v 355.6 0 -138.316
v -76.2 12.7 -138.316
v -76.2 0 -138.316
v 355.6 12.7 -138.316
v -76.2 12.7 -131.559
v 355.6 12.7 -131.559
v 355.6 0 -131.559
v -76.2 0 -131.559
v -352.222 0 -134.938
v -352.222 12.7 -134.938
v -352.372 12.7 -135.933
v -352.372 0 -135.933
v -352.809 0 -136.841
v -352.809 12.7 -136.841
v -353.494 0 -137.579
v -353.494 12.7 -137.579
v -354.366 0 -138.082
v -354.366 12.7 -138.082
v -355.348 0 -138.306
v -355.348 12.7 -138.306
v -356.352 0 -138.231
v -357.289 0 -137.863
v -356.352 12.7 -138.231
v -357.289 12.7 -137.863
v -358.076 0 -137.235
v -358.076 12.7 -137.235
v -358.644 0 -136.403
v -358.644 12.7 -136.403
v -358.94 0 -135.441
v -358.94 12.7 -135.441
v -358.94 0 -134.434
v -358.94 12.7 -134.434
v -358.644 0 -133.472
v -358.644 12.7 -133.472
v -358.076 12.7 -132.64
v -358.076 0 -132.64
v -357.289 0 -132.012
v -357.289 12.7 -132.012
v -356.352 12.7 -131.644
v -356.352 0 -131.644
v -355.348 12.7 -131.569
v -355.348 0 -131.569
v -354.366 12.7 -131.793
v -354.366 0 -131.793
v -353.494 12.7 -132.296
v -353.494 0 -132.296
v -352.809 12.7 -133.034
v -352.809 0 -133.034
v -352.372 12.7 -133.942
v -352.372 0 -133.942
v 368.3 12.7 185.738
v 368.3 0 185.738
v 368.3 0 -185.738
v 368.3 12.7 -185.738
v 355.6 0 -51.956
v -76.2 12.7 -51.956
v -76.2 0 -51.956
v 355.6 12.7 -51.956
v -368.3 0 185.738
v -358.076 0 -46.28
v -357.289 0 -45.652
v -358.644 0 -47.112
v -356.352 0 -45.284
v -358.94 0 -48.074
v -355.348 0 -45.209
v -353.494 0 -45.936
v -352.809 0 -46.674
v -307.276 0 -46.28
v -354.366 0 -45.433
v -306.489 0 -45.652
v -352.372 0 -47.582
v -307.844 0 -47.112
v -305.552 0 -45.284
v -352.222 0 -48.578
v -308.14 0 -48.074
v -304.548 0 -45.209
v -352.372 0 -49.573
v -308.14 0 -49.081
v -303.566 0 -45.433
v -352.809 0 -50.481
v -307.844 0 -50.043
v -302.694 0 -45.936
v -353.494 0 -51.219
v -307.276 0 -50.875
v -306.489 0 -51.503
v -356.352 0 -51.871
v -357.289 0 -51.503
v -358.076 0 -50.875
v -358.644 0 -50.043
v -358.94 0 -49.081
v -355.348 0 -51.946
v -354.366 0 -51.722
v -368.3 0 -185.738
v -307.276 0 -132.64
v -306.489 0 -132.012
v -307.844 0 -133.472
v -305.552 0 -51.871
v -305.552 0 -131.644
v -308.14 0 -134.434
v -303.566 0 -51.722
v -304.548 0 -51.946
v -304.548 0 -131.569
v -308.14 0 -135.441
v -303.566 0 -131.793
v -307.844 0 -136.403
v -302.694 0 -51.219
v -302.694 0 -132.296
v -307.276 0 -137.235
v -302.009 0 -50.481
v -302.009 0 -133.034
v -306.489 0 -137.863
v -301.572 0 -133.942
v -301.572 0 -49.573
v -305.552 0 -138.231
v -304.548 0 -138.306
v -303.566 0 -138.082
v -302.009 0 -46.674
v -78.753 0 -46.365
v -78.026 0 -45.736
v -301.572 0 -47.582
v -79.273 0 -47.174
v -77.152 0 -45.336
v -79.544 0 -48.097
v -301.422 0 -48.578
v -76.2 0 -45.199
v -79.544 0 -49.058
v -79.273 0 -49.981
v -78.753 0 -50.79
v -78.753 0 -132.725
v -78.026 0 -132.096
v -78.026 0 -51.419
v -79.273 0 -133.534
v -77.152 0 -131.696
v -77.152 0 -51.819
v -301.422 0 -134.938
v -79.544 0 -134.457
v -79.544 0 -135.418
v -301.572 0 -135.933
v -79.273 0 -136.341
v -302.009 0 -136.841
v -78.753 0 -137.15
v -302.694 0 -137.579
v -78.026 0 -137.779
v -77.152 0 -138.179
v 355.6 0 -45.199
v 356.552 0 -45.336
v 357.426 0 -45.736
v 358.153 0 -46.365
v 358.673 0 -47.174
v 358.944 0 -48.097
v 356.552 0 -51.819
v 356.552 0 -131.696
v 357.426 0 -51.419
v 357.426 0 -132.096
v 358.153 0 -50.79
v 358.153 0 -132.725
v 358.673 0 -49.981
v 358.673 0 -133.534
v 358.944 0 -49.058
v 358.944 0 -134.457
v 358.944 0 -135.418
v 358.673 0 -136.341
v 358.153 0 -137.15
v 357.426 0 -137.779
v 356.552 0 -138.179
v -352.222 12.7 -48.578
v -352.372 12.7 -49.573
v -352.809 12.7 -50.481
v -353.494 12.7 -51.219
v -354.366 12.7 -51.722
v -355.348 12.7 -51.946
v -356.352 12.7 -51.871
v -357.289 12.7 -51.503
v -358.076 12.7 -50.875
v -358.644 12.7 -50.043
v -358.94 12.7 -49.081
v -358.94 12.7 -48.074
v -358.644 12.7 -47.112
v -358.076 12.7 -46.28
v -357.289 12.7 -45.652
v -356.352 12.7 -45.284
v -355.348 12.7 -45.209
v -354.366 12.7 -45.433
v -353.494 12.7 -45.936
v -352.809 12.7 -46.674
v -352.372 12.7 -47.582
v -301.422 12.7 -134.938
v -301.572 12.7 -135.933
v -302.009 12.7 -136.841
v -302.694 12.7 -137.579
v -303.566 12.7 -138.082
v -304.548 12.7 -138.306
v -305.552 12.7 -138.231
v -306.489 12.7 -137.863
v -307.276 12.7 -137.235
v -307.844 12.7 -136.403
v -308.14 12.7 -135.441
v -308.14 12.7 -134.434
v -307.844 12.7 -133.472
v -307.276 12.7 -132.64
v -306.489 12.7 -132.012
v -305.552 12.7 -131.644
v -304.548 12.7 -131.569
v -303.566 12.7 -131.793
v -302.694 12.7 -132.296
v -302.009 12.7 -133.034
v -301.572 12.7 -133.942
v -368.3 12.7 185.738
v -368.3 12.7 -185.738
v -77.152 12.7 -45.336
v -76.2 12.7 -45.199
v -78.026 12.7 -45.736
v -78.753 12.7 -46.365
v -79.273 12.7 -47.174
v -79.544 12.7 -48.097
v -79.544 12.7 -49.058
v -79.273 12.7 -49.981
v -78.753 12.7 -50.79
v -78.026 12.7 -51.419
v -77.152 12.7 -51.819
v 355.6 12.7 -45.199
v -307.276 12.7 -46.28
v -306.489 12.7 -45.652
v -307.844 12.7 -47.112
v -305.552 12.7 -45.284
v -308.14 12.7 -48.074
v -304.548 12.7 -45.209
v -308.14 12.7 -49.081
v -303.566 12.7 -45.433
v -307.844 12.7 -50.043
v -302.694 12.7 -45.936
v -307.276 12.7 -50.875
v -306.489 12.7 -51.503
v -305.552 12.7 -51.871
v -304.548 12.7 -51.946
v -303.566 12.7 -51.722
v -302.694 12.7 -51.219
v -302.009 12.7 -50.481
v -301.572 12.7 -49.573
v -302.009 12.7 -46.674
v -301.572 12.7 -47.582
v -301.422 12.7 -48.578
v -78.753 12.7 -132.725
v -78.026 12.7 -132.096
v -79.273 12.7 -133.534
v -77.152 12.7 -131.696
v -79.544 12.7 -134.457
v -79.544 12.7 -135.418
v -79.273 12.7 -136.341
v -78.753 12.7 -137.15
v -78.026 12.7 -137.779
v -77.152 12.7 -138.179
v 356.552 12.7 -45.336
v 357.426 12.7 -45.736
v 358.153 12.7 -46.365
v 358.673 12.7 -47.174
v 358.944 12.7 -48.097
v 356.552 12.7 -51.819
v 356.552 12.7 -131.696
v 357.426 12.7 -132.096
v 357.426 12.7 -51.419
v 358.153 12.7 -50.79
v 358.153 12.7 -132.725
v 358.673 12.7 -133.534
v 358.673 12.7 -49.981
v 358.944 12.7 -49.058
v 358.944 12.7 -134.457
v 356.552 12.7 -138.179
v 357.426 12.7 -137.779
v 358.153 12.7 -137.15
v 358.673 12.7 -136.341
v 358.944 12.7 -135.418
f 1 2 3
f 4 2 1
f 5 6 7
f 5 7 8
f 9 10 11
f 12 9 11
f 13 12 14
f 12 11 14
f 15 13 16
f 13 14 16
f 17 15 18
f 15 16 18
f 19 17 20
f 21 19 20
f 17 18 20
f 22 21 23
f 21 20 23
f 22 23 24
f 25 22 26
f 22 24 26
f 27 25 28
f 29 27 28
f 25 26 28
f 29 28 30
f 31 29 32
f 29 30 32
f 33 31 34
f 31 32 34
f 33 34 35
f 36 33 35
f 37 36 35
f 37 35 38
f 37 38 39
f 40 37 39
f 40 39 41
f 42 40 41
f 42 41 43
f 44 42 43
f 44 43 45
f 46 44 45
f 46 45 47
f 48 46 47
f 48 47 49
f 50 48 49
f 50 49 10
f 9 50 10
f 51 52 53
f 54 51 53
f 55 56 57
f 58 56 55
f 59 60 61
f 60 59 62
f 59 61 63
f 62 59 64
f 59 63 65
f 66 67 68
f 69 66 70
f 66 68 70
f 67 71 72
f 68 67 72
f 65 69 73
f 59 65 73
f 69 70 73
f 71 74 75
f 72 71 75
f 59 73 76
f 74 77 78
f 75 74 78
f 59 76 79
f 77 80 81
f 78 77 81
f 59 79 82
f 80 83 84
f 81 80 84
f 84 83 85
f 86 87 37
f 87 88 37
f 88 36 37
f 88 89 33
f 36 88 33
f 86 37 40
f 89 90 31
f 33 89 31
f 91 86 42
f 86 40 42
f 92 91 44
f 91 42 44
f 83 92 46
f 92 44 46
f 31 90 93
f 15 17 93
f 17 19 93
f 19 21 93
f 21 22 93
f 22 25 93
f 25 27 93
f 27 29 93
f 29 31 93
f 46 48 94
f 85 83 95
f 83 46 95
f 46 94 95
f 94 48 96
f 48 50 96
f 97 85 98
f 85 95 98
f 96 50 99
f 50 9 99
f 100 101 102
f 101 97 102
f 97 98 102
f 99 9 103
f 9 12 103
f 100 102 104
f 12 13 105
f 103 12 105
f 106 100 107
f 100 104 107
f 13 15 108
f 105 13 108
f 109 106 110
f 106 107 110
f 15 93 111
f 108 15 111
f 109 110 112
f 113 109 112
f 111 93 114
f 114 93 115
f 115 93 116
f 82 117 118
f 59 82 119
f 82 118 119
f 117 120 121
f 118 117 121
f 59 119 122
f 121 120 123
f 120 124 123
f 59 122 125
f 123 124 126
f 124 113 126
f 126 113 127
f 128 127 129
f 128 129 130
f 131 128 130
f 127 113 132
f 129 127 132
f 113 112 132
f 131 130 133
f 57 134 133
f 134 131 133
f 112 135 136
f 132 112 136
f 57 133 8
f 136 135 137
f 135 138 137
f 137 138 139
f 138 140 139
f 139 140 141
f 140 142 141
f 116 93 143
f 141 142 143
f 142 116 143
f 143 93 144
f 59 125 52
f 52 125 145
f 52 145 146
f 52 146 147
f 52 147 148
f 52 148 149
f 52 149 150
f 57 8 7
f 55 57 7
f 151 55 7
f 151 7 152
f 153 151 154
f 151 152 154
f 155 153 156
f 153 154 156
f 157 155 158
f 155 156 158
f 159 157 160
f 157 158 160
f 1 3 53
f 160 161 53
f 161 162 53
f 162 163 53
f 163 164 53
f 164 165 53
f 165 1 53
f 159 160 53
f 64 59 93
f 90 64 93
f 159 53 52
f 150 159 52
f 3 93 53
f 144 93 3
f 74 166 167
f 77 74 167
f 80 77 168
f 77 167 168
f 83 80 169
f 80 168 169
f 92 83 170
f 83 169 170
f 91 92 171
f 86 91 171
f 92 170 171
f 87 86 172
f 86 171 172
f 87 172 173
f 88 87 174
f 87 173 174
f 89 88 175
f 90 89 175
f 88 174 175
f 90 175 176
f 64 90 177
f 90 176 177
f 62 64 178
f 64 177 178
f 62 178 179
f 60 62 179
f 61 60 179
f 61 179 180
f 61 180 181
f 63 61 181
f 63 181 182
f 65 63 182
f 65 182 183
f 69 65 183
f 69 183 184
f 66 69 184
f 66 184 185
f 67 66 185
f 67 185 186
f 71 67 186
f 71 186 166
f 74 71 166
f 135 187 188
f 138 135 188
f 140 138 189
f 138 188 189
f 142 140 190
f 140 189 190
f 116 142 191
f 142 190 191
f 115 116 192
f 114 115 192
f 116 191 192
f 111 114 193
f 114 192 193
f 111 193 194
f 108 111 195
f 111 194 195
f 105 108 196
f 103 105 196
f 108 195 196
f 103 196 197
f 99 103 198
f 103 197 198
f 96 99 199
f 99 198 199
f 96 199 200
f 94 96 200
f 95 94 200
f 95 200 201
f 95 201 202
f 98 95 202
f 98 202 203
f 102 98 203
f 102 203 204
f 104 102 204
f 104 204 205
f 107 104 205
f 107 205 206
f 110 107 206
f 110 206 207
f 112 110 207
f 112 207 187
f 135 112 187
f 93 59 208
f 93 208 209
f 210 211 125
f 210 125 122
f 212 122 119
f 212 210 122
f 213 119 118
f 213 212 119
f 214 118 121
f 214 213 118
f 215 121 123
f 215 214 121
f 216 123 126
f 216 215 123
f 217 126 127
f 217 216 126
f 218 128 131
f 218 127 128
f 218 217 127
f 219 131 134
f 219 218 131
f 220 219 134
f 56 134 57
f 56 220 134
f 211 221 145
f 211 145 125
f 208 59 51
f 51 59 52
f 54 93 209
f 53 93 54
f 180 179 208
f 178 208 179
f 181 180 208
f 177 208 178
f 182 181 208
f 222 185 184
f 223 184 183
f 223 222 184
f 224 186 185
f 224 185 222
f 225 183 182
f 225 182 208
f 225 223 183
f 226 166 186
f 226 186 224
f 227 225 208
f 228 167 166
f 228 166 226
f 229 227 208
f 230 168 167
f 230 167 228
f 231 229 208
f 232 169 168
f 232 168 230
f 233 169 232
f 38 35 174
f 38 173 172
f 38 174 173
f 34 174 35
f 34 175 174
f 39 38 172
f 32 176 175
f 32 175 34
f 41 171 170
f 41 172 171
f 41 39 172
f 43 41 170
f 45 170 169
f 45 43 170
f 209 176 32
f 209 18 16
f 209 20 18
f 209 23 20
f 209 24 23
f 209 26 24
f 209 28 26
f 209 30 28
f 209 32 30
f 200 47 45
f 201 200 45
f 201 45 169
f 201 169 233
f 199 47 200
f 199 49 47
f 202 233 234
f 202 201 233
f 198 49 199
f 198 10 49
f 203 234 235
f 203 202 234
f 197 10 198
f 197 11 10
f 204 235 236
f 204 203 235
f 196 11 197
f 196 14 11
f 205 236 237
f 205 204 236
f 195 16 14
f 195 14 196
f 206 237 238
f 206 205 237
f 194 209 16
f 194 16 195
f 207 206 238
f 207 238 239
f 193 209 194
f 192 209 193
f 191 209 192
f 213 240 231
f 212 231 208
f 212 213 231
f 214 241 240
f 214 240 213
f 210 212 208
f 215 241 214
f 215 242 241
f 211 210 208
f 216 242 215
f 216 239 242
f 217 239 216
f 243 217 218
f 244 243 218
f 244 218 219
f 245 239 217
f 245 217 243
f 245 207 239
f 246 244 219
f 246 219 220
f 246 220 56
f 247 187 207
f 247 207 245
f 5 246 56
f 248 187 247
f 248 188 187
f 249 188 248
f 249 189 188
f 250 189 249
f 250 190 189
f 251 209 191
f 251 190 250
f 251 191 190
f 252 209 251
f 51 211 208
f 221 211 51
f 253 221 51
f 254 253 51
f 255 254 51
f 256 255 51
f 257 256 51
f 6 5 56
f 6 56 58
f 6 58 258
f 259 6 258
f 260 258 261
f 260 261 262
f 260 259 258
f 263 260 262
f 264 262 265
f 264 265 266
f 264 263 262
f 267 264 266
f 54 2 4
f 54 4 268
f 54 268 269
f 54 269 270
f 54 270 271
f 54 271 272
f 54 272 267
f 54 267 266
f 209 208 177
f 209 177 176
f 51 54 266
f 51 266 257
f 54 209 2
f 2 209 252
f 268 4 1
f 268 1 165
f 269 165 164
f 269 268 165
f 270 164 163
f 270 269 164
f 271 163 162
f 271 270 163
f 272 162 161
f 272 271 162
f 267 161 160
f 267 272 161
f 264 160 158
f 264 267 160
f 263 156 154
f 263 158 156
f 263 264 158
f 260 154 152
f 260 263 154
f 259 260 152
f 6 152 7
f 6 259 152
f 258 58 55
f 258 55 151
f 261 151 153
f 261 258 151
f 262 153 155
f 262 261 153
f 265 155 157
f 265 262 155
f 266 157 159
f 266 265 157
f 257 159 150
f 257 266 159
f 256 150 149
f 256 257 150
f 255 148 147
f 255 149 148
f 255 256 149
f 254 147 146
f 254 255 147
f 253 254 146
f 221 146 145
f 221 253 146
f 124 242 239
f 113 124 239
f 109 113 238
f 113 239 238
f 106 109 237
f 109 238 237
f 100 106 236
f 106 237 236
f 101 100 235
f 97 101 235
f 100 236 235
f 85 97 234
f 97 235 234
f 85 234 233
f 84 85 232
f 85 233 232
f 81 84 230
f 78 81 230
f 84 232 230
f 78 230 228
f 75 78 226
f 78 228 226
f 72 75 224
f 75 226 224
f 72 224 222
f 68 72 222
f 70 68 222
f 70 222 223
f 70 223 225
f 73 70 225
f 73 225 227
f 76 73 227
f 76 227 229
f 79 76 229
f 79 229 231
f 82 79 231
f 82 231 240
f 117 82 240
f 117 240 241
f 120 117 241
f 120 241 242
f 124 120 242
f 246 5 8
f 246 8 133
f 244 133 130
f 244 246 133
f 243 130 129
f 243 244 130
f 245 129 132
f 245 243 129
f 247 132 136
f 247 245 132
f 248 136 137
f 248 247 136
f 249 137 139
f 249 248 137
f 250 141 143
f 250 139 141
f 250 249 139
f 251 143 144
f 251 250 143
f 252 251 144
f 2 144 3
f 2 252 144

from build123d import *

# Parameters (mm, degrees)
SKETCH1_W           = 736.6
SKETCH1_H           = 371.475
BOSS_EXTRUDE1_DEPTH = 12.7
SKETCH2_R           = 3.3782
CUT_EXTRUDE1_DEPTH  = 13.7


with BuildPart() as part:
    # Sketch1 → Boss-Extrude1 (new body)
    with BuildSketch(Plane(origin=(0, 0, 0), x_dir=(1, 0, 0), z_dir=(0, 1, 0))):
        Rectangle(SKETCH1_W, SKETCH1_H)
    extrude(amount=BOSS_EXTRUDE1_DEPTH)

    # Sketch2 → Cut-Extrude1 (cut, through all)
    with BuildSketch(Plane(origin=(0, 12.7, 0), x_dir=(1, 0, 0), z_dir=(0, 1, 0))):
        with Locations((-355.6, 134.9375)):
            Circle(SKETCH2_R)
        with Locations((-355.6, 48.5775)):
            Circle(SKETCH2_R)
        with Locations((-304.8, 48.5775)):
            Circle(SKETCH2_R)
        with Locations((-304.8, 134.9375)):
            Circle(SKETCH2_R)
        with BuildLine():
            Line((-76.2, 138.3157), (355.6, 138.3157))
            ThreePointArc((355.6, 138.3157), (358.9782, 134.9375), (355.6, 131.5593))
            Line((355.6, 131.5593), (-76.2, 131.5593))
            ThreePointArc((-76.2, 131.5593), (-79.5782, 134.9375), (-76.2, 138.3157))
        make_face()
        with BuildLine():
            Line((-76.2, 51.9557), (355.6, 51.9557))
            ThreePointArc((355.6, 51.9557), (358.9782, 48.5775), (355.6, 45.1993))
            Line((355.6, 45.1993), (-76.2, 45.1993))
            ThreePointArc((-76.2, 45.1993), (-79.5782, 48.5775), (-76.2, 51.9557))
        make_face()
    extrude(amount=-CUT_EXTRUDE1_DEPTH, mode=Mode.SUBTRACT)


solid = part.part
